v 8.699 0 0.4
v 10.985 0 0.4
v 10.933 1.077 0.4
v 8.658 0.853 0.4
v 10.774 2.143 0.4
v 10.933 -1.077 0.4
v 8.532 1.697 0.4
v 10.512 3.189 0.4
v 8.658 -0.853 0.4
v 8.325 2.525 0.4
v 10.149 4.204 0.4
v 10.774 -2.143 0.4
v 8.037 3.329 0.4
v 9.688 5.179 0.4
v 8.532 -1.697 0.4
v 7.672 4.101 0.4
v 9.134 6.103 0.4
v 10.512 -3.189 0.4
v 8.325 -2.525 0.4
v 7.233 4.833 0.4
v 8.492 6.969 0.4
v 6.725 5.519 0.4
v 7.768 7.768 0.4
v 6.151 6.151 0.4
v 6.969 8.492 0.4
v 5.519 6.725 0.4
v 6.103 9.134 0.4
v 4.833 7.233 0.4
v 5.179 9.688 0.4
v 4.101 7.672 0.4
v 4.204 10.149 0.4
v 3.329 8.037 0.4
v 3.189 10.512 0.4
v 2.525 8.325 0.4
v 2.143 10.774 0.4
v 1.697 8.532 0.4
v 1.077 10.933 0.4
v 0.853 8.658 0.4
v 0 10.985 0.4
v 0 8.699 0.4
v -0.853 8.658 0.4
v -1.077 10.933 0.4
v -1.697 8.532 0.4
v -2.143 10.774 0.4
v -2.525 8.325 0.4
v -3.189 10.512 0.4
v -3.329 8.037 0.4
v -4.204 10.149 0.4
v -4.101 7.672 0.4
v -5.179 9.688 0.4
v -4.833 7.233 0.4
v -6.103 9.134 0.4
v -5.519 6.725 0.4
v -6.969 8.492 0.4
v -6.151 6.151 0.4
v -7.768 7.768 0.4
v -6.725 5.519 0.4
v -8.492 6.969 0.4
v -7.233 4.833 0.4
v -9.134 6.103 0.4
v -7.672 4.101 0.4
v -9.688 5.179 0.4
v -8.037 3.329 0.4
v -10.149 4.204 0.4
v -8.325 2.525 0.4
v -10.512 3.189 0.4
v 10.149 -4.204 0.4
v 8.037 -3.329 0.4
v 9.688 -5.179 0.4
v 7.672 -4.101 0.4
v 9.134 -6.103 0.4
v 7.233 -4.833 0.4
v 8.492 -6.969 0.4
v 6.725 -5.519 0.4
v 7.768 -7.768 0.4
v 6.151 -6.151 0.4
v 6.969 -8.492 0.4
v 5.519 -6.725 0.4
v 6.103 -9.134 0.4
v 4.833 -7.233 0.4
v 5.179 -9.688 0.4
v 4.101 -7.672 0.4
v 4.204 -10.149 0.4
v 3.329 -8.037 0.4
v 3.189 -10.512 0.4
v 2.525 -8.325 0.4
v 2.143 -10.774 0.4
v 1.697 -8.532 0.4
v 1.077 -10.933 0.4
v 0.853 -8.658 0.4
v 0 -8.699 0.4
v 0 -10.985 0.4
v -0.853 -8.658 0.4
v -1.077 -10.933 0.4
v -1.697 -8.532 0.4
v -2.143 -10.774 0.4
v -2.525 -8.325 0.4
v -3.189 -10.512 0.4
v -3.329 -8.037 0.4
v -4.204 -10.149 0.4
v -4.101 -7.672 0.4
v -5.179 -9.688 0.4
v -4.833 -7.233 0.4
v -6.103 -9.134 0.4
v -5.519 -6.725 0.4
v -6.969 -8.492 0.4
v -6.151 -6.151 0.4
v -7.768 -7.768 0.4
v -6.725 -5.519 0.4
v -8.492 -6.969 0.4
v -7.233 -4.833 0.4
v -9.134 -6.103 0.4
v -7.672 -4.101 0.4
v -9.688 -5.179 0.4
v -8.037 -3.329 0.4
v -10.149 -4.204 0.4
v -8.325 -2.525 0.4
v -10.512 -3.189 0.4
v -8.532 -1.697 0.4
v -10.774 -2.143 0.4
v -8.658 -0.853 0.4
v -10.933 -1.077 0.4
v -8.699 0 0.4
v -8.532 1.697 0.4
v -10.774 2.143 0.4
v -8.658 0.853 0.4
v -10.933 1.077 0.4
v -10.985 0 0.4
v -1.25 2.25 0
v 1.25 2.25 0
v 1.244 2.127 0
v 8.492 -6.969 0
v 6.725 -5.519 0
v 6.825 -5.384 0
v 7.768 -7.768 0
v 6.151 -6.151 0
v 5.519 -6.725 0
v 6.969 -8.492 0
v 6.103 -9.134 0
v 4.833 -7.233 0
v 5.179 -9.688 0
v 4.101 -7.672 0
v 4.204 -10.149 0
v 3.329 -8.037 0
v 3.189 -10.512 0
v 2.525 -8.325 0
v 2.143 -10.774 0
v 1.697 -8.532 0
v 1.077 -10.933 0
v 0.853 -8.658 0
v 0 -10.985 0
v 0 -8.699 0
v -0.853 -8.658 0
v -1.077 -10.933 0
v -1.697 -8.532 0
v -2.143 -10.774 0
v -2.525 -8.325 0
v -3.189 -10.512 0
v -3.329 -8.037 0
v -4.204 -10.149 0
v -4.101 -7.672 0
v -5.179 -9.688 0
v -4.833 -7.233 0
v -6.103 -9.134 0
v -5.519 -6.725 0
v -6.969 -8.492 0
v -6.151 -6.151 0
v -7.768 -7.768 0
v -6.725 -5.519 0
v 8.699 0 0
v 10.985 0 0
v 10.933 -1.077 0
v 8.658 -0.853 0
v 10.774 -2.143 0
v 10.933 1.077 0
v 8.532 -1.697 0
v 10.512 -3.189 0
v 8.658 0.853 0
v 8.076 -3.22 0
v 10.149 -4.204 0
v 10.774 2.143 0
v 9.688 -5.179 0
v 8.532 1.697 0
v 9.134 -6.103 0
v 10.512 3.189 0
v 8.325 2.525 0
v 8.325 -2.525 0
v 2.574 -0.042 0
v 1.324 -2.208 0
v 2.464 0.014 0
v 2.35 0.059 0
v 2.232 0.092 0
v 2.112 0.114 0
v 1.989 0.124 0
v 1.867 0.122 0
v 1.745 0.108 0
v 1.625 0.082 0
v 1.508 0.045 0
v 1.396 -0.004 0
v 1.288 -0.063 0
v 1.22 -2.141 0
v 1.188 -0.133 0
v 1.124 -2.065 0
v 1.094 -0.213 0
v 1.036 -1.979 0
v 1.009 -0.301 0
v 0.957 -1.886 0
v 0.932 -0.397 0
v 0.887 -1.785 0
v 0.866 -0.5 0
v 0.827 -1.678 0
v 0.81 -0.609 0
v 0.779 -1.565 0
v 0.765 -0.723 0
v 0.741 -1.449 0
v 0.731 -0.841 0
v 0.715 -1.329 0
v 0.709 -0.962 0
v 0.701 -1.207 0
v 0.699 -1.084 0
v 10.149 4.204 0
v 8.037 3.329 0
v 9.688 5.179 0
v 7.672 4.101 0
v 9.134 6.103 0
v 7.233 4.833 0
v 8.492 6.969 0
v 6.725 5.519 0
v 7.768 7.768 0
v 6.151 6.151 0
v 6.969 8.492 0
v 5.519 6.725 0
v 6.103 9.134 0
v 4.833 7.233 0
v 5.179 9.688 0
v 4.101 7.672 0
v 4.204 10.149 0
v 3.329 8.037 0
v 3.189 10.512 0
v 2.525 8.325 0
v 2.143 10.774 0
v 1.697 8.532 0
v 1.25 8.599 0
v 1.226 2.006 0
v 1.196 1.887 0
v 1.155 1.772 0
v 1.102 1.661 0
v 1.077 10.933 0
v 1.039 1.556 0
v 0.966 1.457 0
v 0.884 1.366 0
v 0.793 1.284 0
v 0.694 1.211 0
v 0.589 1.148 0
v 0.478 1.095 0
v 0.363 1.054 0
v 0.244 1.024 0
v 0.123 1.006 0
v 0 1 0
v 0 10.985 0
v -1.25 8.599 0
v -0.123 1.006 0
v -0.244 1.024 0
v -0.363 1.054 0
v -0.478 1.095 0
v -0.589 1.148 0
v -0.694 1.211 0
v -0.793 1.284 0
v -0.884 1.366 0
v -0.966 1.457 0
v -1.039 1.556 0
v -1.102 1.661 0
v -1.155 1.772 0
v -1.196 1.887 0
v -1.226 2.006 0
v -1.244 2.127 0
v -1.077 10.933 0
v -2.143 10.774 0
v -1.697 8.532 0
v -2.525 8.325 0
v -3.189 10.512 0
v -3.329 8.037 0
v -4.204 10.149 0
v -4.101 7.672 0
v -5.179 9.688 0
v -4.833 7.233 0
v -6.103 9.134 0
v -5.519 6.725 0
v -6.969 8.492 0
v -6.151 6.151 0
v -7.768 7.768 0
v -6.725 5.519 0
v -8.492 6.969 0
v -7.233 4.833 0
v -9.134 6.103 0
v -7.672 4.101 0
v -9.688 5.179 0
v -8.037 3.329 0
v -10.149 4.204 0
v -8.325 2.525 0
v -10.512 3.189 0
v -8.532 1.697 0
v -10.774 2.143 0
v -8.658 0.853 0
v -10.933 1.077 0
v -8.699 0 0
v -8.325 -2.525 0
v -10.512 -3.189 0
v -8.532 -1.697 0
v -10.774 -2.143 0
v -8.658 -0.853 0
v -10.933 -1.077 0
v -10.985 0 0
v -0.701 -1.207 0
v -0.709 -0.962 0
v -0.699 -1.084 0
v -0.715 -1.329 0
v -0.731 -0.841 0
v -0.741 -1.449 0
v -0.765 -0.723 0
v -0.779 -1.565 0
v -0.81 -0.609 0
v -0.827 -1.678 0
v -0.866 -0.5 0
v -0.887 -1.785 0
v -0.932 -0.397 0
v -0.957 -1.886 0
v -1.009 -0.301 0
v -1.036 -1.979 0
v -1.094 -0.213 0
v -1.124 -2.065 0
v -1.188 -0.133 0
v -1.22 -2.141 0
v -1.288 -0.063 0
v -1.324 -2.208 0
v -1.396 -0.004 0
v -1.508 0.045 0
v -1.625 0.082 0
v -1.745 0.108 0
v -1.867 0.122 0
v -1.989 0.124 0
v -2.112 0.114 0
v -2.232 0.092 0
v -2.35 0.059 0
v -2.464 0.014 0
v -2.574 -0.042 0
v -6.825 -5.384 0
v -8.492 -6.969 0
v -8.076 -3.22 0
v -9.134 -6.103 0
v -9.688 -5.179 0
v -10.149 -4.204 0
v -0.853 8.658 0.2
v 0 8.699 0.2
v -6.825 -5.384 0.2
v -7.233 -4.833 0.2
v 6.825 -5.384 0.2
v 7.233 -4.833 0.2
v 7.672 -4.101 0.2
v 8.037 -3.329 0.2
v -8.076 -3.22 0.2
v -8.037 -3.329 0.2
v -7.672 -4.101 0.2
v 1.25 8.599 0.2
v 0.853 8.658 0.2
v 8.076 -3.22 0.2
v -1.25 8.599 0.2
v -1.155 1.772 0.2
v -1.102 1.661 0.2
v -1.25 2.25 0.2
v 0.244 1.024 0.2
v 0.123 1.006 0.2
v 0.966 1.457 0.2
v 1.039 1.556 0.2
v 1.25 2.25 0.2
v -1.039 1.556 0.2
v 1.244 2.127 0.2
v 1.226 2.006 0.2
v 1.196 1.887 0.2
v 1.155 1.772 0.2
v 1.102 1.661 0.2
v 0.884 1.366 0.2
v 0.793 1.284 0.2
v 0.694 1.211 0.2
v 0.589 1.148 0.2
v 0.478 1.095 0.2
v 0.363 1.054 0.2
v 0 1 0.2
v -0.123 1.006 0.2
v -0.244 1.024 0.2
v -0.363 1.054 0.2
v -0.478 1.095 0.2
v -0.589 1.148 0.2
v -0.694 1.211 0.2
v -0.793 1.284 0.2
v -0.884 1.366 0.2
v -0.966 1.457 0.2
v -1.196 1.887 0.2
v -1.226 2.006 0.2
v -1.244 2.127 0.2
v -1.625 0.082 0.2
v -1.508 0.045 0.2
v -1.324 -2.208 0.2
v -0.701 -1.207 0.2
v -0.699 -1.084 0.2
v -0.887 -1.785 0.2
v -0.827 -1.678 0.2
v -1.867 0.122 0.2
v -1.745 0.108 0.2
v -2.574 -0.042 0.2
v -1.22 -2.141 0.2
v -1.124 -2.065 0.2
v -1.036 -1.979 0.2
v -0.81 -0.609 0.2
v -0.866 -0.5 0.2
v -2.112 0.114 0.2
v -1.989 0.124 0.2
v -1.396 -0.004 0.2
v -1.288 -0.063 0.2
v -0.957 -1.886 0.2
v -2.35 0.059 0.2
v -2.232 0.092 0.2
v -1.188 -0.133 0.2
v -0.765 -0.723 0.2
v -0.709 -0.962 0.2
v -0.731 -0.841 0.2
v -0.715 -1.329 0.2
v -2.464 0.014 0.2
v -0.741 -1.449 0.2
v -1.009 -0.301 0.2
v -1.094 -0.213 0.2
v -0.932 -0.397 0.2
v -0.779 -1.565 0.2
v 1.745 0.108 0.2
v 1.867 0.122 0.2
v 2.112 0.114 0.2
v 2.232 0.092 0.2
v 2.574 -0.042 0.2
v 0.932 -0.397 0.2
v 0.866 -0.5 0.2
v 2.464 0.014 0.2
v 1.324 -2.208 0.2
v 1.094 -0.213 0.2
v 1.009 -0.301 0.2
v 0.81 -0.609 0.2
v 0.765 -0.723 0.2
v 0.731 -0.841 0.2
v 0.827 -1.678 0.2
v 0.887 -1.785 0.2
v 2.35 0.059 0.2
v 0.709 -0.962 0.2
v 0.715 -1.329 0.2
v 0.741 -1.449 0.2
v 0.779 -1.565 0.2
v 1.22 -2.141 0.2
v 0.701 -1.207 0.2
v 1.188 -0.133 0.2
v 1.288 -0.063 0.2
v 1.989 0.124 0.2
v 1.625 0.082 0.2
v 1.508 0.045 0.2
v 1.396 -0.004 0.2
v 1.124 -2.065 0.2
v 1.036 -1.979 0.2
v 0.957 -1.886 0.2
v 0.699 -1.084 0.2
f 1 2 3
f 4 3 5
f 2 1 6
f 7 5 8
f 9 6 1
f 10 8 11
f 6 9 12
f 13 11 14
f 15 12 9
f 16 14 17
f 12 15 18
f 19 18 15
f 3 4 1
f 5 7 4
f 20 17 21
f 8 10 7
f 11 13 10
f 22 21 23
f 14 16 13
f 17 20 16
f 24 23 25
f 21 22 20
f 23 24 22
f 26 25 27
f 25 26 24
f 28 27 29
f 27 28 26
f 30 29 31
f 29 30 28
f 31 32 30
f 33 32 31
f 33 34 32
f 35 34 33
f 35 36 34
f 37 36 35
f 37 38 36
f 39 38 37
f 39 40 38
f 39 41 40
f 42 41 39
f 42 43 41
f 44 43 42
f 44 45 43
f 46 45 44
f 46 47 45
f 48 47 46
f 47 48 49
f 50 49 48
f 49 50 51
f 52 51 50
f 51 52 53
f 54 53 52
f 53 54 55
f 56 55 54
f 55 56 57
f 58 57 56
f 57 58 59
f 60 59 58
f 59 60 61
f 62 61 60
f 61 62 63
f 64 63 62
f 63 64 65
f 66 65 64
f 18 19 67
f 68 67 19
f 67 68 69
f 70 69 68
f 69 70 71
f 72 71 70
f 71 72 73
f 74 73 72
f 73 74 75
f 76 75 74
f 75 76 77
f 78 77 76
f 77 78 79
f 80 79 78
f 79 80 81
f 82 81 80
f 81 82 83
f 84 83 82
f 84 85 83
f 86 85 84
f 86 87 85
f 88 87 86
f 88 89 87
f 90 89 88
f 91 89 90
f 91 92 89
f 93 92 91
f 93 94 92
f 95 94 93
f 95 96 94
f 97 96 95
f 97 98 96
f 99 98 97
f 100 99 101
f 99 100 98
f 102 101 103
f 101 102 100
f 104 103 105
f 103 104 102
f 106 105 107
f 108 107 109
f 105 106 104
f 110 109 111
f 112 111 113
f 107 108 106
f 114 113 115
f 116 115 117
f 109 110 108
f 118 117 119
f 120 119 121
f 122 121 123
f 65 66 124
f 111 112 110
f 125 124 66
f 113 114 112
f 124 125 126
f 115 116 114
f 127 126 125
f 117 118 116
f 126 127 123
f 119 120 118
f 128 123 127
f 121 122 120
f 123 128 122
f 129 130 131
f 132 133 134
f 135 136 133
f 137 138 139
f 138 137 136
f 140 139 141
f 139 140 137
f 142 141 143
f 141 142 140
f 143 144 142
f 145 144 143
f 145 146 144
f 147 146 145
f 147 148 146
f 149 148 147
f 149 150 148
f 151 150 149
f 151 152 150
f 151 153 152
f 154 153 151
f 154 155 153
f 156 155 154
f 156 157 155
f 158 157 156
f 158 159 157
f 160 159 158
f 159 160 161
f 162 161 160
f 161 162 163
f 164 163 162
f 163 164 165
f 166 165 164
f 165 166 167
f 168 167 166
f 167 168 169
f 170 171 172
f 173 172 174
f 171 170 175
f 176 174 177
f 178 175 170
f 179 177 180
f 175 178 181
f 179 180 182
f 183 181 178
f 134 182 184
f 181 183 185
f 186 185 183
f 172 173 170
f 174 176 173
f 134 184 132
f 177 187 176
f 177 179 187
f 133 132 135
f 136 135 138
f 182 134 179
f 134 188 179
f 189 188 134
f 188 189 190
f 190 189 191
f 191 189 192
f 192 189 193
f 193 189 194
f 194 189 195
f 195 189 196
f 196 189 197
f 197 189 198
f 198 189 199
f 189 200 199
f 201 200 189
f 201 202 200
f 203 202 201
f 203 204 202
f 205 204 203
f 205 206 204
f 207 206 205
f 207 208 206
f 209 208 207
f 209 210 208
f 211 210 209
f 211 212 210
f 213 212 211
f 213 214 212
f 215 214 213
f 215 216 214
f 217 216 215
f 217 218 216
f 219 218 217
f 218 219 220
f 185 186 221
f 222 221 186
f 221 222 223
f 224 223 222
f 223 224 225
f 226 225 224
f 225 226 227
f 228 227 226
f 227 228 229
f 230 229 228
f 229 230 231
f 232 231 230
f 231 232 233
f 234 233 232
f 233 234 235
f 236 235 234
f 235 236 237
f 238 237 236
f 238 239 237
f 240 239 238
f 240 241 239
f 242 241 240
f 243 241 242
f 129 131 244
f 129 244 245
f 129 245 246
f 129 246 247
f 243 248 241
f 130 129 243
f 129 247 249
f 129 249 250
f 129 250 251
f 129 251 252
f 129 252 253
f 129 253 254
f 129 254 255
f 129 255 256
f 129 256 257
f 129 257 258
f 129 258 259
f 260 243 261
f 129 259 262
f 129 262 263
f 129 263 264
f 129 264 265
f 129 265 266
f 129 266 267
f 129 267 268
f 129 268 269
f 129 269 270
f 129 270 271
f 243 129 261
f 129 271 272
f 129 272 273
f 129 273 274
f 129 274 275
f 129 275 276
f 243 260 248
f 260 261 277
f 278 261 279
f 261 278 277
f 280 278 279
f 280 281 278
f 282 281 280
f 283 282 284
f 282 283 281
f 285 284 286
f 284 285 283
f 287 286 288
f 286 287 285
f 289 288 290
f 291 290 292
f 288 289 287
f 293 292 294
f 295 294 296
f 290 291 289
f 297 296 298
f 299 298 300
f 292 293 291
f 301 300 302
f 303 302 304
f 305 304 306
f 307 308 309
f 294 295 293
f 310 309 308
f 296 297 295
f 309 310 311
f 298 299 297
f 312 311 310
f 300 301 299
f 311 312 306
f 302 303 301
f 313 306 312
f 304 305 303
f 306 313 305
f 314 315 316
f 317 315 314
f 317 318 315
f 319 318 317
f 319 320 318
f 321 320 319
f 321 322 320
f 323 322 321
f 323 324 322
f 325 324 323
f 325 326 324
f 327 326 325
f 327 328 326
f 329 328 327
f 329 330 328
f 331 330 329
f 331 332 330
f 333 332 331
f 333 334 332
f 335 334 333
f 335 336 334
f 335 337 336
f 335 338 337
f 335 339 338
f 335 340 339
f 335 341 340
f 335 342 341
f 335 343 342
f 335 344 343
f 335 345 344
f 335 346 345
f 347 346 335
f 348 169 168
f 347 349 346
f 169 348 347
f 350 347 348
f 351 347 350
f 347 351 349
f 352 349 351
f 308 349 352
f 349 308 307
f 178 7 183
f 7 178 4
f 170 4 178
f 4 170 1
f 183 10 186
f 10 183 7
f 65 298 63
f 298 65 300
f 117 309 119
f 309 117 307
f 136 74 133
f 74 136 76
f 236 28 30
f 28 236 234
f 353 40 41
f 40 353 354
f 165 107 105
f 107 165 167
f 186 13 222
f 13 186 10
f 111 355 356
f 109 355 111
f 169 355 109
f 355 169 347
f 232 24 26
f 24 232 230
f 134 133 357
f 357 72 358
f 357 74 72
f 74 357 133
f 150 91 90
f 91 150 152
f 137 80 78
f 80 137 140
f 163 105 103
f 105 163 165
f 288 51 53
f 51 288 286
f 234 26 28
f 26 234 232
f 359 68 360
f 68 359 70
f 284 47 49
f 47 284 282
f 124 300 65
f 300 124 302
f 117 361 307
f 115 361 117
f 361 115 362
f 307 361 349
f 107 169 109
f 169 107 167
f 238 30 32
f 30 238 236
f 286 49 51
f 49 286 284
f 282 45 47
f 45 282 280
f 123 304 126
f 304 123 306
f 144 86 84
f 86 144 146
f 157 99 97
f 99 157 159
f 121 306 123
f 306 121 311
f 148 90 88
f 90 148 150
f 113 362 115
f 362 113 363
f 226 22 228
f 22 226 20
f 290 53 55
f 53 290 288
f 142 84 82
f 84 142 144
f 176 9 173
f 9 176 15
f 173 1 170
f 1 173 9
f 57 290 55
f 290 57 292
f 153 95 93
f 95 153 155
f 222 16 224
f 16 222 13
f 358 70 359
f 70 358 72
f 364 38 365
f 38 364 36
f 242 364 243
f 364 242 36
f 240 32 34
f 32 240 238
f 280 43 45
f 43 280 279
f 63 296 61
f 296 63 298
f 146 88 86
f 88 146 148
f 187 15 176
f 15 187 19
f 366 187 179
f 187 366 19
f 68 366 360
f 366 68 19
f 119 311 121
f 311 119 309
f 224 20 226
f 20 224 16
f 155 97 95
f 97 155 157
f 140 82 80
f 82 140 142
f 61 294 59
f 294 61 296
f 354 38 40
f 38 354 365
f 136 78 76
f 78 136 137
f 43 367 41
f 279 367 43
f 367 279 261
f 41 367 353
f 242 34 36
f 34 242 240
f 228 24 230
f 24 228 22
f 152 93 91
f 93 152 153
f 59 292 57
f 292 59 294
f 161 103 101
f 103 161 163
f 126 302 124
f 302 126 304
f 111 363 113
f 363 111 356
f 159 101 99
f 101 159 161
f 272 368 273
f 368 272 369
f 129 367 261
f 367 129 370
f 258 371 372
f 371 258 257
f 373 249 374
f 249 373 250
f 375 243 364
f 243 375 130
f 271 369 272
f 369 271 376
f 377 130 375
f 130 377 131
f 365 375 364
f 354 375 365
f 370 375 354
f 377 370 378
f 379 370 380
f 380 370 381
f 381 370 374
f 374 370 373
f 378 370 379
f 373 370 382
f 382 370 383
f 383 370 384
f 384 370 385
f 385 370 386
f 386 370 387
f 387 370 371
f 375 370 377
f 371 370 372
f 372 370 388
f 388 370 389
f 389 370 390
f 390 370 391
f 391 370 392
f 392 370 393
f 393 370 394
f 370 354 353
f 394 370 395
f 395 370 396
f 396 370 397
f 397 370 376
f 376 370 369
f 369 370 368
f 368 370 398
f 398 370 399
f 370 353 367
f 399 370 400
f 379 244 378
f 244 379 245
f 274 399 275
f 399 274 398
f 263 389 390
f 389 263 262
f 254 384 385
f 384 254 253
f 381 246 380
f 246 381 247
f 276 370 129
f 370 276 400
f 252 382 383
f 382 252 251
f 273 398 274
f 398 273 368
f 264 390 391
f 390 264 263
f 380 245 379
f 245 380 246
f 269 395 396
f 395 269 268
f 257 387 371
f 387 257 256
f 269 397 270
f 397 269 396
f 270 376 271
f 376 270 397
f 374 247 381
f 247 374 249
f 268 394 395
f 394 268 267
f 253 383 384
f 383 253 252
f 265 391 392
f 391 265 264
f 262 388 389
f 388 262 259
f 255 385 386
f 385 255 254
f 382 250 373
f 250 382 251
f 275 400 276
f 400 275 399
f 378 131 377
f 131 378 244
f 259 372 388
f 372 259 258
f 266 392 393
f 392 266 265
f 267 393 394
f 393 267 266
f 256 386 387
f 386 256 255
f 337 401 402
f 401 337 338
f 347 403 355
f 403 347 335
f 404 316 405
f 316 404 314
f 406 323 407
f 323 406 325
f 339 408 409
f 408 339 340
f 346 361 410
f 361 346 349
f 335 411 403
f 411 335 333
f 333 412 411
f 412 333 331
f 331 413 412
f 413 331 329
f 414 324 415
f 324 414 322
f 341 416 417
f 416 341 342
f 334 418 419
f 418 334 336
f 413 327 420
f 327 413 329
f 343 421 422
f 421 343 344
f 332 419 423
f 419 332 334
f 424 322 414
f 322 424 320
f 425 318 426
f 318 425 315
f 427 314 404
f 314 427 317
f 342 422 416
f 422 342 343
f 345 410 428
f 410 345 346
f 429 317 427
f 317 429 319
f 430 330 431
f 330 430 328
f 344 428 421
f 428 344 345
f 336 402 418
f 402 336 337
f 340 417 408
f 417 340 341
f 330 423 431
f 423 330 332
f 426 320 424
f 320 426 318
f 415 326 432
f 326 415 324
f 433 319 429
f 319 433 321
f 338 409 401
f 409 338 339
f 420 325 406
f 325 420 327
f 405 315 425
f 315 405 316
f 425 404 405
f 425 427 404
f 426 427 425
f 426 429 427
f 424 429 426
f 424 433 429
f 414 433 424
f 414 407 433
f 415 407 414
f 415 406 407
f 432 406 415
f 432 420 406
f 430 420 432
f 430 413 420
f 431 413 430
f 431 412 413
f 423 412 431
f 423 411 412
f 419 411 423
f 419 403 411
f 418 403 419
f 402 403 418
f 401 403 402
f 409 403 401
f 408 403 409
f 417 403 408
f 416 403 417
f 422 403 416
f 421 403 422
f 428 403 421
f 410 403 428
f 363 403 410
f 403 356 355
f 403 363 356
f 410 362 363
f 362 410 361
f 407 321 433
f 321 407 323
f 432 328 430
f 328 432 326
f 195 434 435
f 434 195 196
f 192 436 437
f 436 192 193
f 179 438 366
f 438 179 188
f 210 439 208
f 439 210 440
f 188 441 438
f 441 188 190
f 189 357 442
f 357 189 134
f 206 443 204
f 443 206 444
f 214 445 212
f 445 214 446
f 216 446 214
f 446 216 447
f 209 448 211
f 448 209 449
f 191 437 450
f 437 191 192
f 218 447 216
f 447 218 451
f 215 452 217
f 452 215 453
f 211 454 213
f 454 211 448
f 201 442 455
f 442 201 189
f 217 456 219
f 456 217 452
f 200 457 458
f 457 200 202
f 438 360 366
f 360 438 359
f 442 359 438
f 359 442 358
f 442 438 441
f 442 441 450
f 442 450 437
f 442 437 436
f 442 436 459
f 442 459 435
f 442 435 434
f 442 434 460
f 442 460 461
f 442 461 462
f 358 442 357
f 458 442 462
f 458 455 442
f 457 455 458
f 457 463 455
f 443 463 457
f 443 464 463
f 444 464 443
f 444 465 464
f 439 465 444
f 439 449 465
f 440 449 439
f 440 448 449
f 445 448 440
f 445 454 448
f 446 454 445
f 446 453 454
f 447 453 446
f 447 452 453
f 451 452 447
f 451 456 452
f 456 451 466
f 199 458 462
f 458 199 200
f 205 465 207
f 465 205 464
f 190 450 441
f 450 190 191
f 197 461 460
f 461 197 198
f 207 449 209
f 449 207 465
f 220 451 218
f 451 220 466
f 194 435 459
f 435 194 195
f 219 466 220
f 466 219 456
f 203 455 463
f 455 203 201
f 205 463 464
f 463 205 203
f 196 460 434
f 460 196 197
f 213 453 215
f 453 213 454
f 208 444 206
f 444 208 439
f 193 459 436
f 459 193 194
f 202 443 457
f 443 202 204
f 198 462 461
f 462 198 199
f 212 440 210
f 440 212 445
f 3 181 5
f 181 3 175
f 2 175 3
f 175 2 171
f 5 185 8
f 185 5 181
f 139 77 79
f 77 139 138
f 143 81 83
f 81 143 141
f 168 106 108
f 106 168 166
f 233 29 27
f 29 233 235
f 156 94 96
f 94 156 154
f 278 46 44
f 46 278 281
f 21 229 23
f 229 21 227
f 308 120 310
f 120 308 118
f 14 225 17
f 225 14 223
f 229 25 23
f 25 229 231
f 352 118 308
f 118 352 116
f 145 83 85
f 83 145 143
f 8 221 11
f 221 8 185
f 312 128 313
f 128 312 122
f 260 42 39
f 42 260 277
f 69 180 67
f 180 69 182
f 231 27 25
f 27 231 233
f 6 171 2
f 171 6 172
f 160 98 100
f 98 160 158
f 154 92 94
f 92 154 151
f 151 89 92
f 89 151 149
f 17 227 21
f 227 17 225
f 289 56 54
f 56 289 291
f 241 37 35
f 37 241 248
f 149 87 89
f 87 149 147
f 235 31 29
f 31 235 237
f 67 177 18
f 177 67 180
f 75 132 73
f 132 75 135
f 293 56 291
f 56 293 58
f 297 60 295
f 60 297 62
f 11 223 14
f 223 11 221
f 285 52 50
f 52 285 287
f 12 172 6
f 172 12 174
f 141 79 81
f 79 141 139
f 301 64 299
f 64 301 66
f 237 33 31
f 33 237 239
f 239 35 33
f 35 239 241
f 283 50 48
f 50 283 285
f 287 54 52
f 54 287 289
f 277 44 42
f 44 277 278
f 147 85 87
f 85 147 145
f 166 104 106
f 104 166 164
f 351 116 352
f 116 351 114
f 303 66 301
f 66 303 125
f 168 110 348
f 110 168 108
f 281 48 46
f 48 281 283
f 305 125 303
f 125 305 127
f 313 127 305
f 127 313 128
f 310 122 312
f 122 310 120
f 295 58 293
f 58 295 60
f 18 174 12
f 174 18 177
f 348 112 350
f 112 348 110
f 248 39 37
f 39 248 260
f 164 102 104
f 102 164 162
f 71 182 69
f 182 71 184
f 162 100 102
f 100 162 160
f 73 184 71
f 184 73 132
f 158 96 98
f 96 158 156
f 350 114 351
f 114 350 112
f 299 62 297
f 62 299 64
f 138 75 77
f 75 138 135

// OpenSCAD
//  Outer diameter
OD_inch = 0.865;
//  Inner diameter
ID_inch = 0.685;
Lip_Thickness = 0.4;
//  Number of prongs
N = 3;
//  Distance from prong edge to center
D = 1;
//  Prong diameter
PD = 2.5;
Prong_Thickness=0.2;
//  Facets for circles
$fn=64;

anti_rollout();

module anti_rollout() {
	intersection() {
		cylinder(h=Lip_Thickness*3, r=25.4*OD_inch/2, center=true);
		union() {
			difference() {
				cylinder(h=Lip_Thickness, r=1.01*25.4*OD_inch/2);
				cylinder(h=Lip_Thickness*3, r=25.4*ID_inch/2, center=true);
			}
			for (a=[0:N-1]) rotate([0,0,360*a/N]) hull() {
					translate([0,D+PD/2,0]) cylinder(h=Prong_Thickness,r=PD/2);
					translate([0,25.4*ID_inch/2,0]) cylinder(h=Prong_Thickness,r=PD/2);
			}
		}
	}
}
